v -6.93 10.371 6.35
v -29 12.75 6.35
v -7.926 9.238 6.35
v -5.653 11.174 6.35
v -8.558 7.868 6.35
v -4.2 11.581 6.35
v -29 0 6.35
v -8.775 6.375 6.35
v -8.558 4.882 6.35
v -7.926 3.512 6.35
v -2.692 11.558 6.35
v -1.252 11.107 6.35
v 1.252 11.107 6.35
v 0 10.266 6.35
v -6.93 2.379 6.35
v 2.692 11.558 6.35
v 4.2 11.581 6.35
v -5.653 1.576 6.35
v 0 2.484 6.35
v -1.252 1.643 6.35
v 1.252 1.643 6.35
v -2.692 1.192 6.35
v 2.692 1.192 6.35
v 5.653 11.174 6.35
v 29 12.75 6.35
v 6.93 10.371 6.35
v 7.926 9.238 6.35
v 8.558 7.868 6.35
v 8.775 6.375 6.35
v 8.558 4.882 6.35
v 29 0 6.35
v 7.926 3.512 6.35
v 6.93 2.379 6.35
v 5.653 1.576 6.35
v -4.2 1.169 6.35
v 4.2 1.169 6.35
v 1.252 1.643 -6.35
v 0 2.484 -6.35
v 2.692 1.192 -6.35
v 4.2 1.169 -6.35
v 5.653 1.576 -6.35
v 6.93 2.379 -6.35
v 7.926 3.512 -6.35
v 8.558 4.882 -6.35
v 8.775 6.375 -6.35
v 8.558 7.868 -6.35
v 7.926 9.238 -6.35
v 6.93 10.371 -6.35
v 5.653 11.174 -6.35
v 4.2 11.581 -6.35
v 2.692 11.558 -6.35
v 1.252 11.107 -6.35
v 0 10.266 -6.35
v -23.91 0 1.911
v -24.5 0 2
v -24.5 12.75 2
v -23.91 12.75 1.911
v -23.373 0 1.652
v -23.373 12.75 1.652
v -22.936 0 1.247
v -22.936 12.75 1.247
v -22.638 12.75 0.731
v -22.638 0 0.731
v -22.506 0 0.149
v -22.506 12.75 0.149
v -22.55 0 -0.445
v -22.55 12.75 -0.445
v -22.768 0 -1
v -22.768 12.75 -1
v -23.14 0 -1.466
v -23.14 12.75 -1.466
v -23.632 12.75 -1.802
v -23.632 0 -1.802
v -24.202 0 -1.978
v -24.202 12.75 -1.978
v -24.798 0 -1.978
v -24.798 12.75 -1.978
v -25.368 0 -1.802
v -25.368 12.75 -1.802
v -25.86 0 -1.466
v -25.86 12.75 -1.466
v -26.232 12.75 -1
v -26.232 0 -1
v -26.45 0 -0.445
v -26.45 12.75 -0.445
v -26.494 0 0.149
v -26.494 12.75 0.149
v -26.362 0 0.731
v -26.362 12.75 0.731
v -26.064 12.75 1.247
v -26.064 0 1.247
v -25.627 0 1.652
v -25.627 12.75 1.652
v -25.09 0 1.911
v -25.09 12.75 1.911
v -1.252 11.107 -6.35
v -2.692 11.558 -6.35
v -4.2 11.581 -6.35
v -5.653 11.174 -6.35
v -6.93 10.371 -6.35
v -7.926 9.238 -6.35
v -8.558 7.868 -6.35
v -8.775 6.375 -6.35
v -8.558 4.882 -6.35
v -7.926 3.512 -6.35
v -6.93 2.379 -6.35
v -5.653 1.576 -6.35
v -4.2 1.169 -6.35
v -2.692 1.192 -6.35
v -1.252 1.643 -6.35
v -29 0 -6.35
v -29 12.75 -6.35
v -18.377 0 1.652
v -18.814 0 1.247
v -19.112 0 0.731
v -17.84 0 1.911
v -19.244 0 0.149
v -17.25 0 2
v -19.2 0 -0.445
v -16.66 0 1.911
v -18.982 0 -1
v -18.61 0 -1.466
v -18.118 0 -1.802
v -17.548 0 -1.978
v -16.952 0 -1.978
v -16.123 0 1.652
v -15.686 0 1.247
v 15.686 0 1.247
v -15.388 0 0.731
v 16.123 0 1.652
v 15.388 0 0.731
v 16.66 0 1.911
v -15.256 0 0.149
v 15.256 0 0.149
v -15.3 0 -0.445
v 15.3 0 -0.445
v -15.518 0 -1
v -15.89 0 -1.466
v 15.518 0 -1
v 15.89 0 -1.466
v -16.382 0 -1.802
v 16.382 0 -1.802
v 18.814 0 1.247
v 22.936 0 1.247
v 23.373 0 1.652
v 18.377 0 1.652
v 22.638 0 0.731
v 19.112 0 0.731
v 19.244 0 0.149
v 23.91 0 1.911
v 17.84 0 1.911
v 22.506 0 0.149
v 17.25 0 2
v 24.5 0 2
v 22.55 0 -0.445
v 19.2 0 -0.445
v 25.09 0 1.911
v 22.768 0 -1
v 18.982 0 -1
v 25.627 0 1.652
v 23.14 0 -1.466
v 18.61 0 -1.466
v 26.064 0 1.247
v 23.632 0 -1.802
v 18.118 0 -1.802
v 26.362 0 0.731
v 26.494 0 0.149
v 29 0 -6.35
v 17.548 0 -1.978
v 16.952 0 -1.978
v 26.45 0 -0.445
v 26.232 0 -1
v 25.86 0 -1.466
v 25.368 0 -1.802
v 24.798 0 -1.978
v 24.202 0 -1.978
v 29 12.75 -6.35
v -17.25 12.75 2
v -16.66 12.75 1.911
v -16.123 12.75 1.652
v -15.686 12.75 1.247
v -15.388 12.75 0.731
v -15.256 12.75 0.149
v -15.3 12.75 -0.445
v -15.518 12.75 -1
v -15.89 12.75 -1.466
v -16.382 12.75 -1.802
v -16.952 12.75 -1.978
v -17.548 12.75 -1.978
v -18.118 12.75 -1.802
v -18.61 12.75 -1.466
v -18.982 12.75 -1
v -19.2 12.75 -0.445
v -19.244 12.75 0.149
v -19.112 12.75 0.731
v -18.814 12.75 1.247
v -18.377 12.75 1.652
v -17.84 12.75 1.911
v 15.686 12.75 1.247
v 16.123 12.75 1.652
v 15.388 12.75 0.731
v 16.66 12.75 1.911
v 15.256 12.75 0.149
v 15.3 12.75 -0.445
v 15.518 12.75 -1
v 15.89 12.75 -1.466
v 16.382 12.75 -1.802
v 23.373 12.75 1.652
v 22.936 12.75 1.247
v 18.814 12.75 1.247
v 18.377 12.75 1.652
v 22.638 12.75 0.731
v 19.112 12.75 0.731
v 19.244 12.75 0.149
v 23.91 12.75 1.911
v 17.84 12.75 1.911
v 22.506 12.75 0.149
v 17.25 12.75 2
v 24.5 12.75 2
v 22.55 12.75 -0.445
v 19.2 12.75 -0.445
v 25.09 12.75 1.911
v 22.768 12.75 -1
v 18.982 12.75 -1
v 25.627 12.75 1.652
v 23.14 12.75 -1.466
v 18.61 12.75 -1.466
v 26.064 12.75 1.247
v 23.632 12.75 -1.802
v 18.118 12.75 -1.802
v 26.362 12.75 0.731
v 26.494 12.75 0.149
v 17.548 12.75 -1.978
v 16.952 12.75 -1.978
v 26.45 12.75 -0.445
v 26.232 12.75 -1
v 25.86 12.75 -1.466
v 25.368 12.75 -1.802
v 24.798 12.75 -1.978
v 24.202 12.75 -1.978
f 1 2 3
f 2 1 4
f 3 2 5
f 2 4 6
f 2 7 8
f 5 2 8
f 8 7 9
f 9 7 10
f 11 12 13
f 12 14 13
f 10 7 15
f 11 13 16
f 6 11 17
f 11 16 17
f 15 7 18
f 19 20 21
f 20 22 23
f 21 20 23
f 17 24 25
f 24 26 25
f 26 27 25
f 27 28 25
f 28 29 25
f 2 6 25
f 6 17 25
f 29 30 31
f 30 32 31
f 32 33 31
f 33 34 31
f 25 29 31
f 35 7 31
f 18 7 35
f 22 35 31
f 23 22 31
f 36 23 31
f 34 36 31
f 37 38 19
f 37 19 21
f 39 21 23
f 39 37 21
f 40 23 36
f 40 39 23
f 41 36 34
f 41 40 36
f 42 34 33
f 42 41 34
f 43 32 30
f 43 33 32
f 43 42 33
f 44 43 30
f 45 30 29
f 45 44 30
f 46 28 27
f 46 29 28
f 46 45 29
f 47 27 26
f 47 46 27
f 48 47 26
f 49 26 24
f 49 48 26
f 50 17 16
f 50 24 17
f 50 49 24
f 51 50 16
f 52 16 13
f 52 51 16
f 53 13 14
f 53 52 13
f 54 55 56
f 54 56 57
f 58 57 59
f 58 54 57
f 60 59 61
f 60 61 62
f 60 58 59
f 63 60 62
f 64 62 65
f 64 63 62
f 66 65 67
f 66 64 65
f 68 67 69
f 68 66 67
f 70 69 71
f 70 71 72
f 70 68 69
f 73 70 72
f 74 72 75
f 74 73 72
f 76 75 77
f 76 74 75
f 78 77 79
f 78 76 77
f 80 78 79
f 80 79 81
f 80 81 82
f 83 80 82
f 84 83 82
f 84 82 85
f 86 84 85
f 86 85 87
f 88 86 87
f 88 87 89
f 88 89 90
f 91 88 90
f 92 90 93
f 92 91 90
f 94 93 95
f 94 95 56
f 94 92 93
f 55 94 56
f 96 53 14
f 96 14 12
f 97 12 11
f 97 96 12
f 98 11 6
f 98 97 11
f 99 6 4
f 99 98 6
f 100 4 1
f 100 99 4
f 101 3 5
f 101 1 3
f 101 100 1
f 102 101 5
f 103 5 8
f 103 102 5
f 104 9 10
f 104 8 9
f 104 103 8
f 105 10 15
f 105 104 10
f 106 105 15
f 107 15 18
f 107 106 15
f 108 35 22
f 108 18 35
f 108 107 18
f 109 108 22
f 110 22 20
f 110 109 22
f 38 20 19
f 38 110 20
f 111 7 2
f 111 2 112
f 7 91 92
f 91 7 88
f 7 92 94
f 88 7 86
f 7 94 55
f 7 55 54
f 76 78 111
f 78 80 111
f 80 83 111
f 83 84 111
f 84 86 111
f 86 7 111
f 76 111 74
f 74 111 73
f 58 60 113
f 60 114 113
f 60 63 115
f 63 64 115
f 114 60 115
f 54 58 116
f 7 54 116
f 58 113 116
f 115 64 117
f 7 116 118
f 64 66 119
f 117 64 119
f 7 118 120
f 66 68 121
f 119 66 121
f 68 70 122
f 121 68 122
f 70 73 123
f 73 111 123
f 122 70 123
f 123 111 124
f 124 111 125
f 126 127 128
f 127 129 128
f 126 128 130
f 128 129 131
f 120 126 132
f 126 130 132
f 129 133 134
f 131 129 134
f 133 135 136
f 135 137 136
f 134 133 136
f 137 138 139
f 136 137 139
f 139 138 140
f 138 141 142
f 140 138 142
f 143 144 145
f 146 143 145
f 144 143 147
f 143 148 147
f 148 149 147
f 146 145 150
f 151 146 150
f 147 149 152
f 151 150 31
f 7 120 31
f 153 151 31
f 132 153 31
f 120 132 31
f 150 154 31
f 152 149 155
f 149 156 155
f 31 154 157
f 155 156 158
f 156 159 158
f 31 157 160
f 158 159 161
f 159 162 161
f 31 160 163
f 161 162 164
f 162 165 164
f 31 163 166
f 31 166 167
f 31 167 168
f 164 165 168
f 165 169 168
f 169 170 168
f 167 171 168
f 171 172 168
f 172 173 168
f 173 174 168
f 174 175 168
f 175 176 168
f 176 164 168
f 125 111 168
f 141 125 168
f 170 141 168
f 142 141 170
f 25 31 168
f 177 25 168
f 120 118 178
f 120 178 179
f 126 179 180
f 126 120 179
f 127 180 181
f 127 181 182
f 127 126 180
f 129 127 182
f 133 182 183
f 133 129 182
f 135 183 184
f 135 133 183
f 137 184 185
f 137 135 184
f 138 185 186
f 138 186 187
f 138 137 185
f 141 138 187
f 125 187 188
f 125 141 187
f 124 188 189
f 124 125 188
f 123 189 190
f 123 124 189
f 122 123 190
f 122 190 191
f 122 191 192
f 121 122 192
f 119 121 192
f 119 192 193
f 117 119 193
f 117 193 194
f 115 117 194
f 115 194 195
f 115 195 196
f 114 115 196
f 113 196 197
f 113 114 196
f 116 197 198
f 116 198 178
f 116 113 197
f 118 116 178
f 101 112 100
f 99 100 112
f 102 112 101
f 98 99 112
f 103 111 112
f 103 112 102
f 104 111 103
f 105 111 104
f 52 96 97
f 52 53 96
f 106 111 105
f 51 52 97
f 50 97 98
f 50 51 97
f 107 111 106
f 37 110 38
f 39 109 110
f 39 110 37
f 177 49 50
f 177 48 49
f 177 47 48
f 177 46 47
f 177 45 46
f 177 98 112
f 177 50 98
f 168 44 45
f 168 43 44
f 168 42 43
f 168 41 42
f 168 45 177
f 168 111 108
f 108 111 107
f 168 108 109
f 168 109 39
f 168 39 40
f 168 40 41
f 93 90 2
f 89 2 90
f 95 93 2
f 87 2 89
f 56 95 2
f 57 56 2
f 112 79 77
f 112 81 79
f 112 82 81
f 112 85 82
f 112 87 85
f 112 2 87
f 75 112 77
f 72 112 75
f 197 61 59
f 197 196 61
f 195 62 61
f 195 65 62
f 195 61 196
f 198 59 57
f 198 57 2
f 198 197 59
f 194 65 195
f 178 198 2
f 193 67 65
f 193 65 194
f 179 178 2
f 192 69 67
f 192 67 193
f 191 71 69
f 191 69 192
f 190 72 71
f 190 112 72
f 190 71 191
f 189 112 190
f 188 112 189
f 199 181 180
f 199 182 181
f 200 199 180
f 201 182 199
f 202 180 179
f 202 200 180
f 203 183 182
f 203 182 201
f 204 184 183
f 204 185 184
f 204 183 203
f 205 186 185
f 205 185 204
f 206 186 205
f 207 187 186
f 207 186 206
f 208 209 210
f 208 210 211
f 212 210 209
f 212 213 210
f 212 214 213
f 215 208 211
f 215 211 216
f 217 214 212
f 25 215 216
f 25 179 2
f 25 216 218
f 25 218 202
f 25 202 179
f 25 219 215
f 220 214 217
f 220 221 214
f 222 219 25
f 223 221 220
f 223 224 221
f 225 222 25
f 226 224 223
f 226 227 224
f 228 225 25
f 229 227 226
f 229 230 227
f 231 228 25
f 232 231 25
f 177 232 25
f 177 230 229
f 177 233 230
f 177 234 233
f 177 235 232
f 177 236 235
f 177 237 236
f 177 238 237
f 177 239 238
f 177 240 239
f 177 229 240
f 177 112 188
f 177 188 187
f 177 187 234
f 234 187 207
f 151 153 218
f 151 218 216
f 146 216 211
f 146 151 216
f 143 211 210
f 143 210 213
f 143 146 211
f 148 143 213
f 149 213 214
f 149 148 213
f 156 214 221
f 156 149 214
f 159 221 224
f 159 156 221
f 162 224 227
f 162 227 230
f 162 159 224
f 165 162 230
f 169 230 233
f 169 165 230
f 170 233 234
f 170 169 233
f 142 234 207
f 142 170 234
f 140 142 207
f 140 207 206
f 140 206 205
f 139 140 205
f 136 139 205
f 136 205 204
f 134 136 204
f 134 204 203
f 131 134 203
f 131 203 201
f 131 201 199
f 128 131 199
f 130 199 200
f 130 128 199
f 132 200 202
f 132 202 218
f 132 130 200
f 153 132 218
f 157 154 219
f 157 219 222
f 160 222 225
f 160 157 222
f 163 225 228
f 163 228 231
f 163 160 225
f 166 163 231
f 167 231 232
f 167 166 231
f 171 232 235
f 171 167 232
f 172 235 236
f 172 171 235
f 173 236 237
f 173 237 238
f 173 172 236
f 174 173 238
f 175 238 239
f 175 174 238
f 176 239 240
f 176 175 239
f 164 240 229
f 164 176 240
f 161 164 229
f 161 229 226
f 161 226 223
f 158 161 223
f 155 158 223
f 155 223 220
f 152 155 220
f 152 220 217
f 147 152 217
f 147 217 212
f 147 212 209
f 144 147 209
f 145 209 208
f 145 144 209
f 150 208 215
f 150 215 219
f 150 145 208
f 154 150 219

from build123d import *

# Parameters (mm, degrees)
SKETCH1_W               = 58
SKETCH1_H               = 12.7
SKETCH1_R               = 2
BOSS_EXTRUDE1_DEPTH     = 12.75
CUT_EXTRUDE2_DEPTH      = 35.129935541
CUT_EXTRUDE2_DEPTH_BACK = 35.129935541


with BuildPart() as part:
    # Sketch1 → Boss-Extrude1 (new body)
    with BuildSketch(Plane(origin=(0, 0, 0), x_dir=(1, 0, 0), z_dir=(0, 1, 0))):
        Rectangle(SKETCH1_W, SKETCH1_H)
        with Locations(Location((-24.5, 0, 0), (0, 0, 270))):
            Circle(SKETCH1_R, mode=Mode.SUBTRACT)
        with Locations(Location((-17.25, 0, 0), (0, 0, 270))):
            Circle(SKETCH1_R, mode=Mode.SUBTRACT)
        with Locations(Location((24.5, 0, 0), (0, 0, 270))):
            Circle(SKETCH1_R, mode=Mode.SUBTRACT)
        with Locations(Location((17.25, 0, 0), (0, 0, 270))):
            Circle(SKETCH1_R, mode=Mode.SUBTRACT)
    extrude(amount=BOSS_EXTRUDE1_DEPTH)

    # Sketch2 → Cut-Extrude2 (cut, two sides: drawn at the far end of the back side and taken through both)
    with BuildSketch(Plane.XY.offset(6.35).offset(-CUT_EXTRUDE2_DEPTH_BACK)):
        with BuildLine():
            ThreePointArc((0, 10.265613705), (-8.775, 6.375), (0, 2.484386295))
            ThreePointArc((0, 2.484386295), (8.775, 6.375), (0, 10.265613705))
        make_face()
    extrude(amount=CUT_EXTRUDE2_DEPTH + CUT_EXTRUDE2_DEPTH_BACK, mode=Mode.SUBTRACT)


solid = part.part
